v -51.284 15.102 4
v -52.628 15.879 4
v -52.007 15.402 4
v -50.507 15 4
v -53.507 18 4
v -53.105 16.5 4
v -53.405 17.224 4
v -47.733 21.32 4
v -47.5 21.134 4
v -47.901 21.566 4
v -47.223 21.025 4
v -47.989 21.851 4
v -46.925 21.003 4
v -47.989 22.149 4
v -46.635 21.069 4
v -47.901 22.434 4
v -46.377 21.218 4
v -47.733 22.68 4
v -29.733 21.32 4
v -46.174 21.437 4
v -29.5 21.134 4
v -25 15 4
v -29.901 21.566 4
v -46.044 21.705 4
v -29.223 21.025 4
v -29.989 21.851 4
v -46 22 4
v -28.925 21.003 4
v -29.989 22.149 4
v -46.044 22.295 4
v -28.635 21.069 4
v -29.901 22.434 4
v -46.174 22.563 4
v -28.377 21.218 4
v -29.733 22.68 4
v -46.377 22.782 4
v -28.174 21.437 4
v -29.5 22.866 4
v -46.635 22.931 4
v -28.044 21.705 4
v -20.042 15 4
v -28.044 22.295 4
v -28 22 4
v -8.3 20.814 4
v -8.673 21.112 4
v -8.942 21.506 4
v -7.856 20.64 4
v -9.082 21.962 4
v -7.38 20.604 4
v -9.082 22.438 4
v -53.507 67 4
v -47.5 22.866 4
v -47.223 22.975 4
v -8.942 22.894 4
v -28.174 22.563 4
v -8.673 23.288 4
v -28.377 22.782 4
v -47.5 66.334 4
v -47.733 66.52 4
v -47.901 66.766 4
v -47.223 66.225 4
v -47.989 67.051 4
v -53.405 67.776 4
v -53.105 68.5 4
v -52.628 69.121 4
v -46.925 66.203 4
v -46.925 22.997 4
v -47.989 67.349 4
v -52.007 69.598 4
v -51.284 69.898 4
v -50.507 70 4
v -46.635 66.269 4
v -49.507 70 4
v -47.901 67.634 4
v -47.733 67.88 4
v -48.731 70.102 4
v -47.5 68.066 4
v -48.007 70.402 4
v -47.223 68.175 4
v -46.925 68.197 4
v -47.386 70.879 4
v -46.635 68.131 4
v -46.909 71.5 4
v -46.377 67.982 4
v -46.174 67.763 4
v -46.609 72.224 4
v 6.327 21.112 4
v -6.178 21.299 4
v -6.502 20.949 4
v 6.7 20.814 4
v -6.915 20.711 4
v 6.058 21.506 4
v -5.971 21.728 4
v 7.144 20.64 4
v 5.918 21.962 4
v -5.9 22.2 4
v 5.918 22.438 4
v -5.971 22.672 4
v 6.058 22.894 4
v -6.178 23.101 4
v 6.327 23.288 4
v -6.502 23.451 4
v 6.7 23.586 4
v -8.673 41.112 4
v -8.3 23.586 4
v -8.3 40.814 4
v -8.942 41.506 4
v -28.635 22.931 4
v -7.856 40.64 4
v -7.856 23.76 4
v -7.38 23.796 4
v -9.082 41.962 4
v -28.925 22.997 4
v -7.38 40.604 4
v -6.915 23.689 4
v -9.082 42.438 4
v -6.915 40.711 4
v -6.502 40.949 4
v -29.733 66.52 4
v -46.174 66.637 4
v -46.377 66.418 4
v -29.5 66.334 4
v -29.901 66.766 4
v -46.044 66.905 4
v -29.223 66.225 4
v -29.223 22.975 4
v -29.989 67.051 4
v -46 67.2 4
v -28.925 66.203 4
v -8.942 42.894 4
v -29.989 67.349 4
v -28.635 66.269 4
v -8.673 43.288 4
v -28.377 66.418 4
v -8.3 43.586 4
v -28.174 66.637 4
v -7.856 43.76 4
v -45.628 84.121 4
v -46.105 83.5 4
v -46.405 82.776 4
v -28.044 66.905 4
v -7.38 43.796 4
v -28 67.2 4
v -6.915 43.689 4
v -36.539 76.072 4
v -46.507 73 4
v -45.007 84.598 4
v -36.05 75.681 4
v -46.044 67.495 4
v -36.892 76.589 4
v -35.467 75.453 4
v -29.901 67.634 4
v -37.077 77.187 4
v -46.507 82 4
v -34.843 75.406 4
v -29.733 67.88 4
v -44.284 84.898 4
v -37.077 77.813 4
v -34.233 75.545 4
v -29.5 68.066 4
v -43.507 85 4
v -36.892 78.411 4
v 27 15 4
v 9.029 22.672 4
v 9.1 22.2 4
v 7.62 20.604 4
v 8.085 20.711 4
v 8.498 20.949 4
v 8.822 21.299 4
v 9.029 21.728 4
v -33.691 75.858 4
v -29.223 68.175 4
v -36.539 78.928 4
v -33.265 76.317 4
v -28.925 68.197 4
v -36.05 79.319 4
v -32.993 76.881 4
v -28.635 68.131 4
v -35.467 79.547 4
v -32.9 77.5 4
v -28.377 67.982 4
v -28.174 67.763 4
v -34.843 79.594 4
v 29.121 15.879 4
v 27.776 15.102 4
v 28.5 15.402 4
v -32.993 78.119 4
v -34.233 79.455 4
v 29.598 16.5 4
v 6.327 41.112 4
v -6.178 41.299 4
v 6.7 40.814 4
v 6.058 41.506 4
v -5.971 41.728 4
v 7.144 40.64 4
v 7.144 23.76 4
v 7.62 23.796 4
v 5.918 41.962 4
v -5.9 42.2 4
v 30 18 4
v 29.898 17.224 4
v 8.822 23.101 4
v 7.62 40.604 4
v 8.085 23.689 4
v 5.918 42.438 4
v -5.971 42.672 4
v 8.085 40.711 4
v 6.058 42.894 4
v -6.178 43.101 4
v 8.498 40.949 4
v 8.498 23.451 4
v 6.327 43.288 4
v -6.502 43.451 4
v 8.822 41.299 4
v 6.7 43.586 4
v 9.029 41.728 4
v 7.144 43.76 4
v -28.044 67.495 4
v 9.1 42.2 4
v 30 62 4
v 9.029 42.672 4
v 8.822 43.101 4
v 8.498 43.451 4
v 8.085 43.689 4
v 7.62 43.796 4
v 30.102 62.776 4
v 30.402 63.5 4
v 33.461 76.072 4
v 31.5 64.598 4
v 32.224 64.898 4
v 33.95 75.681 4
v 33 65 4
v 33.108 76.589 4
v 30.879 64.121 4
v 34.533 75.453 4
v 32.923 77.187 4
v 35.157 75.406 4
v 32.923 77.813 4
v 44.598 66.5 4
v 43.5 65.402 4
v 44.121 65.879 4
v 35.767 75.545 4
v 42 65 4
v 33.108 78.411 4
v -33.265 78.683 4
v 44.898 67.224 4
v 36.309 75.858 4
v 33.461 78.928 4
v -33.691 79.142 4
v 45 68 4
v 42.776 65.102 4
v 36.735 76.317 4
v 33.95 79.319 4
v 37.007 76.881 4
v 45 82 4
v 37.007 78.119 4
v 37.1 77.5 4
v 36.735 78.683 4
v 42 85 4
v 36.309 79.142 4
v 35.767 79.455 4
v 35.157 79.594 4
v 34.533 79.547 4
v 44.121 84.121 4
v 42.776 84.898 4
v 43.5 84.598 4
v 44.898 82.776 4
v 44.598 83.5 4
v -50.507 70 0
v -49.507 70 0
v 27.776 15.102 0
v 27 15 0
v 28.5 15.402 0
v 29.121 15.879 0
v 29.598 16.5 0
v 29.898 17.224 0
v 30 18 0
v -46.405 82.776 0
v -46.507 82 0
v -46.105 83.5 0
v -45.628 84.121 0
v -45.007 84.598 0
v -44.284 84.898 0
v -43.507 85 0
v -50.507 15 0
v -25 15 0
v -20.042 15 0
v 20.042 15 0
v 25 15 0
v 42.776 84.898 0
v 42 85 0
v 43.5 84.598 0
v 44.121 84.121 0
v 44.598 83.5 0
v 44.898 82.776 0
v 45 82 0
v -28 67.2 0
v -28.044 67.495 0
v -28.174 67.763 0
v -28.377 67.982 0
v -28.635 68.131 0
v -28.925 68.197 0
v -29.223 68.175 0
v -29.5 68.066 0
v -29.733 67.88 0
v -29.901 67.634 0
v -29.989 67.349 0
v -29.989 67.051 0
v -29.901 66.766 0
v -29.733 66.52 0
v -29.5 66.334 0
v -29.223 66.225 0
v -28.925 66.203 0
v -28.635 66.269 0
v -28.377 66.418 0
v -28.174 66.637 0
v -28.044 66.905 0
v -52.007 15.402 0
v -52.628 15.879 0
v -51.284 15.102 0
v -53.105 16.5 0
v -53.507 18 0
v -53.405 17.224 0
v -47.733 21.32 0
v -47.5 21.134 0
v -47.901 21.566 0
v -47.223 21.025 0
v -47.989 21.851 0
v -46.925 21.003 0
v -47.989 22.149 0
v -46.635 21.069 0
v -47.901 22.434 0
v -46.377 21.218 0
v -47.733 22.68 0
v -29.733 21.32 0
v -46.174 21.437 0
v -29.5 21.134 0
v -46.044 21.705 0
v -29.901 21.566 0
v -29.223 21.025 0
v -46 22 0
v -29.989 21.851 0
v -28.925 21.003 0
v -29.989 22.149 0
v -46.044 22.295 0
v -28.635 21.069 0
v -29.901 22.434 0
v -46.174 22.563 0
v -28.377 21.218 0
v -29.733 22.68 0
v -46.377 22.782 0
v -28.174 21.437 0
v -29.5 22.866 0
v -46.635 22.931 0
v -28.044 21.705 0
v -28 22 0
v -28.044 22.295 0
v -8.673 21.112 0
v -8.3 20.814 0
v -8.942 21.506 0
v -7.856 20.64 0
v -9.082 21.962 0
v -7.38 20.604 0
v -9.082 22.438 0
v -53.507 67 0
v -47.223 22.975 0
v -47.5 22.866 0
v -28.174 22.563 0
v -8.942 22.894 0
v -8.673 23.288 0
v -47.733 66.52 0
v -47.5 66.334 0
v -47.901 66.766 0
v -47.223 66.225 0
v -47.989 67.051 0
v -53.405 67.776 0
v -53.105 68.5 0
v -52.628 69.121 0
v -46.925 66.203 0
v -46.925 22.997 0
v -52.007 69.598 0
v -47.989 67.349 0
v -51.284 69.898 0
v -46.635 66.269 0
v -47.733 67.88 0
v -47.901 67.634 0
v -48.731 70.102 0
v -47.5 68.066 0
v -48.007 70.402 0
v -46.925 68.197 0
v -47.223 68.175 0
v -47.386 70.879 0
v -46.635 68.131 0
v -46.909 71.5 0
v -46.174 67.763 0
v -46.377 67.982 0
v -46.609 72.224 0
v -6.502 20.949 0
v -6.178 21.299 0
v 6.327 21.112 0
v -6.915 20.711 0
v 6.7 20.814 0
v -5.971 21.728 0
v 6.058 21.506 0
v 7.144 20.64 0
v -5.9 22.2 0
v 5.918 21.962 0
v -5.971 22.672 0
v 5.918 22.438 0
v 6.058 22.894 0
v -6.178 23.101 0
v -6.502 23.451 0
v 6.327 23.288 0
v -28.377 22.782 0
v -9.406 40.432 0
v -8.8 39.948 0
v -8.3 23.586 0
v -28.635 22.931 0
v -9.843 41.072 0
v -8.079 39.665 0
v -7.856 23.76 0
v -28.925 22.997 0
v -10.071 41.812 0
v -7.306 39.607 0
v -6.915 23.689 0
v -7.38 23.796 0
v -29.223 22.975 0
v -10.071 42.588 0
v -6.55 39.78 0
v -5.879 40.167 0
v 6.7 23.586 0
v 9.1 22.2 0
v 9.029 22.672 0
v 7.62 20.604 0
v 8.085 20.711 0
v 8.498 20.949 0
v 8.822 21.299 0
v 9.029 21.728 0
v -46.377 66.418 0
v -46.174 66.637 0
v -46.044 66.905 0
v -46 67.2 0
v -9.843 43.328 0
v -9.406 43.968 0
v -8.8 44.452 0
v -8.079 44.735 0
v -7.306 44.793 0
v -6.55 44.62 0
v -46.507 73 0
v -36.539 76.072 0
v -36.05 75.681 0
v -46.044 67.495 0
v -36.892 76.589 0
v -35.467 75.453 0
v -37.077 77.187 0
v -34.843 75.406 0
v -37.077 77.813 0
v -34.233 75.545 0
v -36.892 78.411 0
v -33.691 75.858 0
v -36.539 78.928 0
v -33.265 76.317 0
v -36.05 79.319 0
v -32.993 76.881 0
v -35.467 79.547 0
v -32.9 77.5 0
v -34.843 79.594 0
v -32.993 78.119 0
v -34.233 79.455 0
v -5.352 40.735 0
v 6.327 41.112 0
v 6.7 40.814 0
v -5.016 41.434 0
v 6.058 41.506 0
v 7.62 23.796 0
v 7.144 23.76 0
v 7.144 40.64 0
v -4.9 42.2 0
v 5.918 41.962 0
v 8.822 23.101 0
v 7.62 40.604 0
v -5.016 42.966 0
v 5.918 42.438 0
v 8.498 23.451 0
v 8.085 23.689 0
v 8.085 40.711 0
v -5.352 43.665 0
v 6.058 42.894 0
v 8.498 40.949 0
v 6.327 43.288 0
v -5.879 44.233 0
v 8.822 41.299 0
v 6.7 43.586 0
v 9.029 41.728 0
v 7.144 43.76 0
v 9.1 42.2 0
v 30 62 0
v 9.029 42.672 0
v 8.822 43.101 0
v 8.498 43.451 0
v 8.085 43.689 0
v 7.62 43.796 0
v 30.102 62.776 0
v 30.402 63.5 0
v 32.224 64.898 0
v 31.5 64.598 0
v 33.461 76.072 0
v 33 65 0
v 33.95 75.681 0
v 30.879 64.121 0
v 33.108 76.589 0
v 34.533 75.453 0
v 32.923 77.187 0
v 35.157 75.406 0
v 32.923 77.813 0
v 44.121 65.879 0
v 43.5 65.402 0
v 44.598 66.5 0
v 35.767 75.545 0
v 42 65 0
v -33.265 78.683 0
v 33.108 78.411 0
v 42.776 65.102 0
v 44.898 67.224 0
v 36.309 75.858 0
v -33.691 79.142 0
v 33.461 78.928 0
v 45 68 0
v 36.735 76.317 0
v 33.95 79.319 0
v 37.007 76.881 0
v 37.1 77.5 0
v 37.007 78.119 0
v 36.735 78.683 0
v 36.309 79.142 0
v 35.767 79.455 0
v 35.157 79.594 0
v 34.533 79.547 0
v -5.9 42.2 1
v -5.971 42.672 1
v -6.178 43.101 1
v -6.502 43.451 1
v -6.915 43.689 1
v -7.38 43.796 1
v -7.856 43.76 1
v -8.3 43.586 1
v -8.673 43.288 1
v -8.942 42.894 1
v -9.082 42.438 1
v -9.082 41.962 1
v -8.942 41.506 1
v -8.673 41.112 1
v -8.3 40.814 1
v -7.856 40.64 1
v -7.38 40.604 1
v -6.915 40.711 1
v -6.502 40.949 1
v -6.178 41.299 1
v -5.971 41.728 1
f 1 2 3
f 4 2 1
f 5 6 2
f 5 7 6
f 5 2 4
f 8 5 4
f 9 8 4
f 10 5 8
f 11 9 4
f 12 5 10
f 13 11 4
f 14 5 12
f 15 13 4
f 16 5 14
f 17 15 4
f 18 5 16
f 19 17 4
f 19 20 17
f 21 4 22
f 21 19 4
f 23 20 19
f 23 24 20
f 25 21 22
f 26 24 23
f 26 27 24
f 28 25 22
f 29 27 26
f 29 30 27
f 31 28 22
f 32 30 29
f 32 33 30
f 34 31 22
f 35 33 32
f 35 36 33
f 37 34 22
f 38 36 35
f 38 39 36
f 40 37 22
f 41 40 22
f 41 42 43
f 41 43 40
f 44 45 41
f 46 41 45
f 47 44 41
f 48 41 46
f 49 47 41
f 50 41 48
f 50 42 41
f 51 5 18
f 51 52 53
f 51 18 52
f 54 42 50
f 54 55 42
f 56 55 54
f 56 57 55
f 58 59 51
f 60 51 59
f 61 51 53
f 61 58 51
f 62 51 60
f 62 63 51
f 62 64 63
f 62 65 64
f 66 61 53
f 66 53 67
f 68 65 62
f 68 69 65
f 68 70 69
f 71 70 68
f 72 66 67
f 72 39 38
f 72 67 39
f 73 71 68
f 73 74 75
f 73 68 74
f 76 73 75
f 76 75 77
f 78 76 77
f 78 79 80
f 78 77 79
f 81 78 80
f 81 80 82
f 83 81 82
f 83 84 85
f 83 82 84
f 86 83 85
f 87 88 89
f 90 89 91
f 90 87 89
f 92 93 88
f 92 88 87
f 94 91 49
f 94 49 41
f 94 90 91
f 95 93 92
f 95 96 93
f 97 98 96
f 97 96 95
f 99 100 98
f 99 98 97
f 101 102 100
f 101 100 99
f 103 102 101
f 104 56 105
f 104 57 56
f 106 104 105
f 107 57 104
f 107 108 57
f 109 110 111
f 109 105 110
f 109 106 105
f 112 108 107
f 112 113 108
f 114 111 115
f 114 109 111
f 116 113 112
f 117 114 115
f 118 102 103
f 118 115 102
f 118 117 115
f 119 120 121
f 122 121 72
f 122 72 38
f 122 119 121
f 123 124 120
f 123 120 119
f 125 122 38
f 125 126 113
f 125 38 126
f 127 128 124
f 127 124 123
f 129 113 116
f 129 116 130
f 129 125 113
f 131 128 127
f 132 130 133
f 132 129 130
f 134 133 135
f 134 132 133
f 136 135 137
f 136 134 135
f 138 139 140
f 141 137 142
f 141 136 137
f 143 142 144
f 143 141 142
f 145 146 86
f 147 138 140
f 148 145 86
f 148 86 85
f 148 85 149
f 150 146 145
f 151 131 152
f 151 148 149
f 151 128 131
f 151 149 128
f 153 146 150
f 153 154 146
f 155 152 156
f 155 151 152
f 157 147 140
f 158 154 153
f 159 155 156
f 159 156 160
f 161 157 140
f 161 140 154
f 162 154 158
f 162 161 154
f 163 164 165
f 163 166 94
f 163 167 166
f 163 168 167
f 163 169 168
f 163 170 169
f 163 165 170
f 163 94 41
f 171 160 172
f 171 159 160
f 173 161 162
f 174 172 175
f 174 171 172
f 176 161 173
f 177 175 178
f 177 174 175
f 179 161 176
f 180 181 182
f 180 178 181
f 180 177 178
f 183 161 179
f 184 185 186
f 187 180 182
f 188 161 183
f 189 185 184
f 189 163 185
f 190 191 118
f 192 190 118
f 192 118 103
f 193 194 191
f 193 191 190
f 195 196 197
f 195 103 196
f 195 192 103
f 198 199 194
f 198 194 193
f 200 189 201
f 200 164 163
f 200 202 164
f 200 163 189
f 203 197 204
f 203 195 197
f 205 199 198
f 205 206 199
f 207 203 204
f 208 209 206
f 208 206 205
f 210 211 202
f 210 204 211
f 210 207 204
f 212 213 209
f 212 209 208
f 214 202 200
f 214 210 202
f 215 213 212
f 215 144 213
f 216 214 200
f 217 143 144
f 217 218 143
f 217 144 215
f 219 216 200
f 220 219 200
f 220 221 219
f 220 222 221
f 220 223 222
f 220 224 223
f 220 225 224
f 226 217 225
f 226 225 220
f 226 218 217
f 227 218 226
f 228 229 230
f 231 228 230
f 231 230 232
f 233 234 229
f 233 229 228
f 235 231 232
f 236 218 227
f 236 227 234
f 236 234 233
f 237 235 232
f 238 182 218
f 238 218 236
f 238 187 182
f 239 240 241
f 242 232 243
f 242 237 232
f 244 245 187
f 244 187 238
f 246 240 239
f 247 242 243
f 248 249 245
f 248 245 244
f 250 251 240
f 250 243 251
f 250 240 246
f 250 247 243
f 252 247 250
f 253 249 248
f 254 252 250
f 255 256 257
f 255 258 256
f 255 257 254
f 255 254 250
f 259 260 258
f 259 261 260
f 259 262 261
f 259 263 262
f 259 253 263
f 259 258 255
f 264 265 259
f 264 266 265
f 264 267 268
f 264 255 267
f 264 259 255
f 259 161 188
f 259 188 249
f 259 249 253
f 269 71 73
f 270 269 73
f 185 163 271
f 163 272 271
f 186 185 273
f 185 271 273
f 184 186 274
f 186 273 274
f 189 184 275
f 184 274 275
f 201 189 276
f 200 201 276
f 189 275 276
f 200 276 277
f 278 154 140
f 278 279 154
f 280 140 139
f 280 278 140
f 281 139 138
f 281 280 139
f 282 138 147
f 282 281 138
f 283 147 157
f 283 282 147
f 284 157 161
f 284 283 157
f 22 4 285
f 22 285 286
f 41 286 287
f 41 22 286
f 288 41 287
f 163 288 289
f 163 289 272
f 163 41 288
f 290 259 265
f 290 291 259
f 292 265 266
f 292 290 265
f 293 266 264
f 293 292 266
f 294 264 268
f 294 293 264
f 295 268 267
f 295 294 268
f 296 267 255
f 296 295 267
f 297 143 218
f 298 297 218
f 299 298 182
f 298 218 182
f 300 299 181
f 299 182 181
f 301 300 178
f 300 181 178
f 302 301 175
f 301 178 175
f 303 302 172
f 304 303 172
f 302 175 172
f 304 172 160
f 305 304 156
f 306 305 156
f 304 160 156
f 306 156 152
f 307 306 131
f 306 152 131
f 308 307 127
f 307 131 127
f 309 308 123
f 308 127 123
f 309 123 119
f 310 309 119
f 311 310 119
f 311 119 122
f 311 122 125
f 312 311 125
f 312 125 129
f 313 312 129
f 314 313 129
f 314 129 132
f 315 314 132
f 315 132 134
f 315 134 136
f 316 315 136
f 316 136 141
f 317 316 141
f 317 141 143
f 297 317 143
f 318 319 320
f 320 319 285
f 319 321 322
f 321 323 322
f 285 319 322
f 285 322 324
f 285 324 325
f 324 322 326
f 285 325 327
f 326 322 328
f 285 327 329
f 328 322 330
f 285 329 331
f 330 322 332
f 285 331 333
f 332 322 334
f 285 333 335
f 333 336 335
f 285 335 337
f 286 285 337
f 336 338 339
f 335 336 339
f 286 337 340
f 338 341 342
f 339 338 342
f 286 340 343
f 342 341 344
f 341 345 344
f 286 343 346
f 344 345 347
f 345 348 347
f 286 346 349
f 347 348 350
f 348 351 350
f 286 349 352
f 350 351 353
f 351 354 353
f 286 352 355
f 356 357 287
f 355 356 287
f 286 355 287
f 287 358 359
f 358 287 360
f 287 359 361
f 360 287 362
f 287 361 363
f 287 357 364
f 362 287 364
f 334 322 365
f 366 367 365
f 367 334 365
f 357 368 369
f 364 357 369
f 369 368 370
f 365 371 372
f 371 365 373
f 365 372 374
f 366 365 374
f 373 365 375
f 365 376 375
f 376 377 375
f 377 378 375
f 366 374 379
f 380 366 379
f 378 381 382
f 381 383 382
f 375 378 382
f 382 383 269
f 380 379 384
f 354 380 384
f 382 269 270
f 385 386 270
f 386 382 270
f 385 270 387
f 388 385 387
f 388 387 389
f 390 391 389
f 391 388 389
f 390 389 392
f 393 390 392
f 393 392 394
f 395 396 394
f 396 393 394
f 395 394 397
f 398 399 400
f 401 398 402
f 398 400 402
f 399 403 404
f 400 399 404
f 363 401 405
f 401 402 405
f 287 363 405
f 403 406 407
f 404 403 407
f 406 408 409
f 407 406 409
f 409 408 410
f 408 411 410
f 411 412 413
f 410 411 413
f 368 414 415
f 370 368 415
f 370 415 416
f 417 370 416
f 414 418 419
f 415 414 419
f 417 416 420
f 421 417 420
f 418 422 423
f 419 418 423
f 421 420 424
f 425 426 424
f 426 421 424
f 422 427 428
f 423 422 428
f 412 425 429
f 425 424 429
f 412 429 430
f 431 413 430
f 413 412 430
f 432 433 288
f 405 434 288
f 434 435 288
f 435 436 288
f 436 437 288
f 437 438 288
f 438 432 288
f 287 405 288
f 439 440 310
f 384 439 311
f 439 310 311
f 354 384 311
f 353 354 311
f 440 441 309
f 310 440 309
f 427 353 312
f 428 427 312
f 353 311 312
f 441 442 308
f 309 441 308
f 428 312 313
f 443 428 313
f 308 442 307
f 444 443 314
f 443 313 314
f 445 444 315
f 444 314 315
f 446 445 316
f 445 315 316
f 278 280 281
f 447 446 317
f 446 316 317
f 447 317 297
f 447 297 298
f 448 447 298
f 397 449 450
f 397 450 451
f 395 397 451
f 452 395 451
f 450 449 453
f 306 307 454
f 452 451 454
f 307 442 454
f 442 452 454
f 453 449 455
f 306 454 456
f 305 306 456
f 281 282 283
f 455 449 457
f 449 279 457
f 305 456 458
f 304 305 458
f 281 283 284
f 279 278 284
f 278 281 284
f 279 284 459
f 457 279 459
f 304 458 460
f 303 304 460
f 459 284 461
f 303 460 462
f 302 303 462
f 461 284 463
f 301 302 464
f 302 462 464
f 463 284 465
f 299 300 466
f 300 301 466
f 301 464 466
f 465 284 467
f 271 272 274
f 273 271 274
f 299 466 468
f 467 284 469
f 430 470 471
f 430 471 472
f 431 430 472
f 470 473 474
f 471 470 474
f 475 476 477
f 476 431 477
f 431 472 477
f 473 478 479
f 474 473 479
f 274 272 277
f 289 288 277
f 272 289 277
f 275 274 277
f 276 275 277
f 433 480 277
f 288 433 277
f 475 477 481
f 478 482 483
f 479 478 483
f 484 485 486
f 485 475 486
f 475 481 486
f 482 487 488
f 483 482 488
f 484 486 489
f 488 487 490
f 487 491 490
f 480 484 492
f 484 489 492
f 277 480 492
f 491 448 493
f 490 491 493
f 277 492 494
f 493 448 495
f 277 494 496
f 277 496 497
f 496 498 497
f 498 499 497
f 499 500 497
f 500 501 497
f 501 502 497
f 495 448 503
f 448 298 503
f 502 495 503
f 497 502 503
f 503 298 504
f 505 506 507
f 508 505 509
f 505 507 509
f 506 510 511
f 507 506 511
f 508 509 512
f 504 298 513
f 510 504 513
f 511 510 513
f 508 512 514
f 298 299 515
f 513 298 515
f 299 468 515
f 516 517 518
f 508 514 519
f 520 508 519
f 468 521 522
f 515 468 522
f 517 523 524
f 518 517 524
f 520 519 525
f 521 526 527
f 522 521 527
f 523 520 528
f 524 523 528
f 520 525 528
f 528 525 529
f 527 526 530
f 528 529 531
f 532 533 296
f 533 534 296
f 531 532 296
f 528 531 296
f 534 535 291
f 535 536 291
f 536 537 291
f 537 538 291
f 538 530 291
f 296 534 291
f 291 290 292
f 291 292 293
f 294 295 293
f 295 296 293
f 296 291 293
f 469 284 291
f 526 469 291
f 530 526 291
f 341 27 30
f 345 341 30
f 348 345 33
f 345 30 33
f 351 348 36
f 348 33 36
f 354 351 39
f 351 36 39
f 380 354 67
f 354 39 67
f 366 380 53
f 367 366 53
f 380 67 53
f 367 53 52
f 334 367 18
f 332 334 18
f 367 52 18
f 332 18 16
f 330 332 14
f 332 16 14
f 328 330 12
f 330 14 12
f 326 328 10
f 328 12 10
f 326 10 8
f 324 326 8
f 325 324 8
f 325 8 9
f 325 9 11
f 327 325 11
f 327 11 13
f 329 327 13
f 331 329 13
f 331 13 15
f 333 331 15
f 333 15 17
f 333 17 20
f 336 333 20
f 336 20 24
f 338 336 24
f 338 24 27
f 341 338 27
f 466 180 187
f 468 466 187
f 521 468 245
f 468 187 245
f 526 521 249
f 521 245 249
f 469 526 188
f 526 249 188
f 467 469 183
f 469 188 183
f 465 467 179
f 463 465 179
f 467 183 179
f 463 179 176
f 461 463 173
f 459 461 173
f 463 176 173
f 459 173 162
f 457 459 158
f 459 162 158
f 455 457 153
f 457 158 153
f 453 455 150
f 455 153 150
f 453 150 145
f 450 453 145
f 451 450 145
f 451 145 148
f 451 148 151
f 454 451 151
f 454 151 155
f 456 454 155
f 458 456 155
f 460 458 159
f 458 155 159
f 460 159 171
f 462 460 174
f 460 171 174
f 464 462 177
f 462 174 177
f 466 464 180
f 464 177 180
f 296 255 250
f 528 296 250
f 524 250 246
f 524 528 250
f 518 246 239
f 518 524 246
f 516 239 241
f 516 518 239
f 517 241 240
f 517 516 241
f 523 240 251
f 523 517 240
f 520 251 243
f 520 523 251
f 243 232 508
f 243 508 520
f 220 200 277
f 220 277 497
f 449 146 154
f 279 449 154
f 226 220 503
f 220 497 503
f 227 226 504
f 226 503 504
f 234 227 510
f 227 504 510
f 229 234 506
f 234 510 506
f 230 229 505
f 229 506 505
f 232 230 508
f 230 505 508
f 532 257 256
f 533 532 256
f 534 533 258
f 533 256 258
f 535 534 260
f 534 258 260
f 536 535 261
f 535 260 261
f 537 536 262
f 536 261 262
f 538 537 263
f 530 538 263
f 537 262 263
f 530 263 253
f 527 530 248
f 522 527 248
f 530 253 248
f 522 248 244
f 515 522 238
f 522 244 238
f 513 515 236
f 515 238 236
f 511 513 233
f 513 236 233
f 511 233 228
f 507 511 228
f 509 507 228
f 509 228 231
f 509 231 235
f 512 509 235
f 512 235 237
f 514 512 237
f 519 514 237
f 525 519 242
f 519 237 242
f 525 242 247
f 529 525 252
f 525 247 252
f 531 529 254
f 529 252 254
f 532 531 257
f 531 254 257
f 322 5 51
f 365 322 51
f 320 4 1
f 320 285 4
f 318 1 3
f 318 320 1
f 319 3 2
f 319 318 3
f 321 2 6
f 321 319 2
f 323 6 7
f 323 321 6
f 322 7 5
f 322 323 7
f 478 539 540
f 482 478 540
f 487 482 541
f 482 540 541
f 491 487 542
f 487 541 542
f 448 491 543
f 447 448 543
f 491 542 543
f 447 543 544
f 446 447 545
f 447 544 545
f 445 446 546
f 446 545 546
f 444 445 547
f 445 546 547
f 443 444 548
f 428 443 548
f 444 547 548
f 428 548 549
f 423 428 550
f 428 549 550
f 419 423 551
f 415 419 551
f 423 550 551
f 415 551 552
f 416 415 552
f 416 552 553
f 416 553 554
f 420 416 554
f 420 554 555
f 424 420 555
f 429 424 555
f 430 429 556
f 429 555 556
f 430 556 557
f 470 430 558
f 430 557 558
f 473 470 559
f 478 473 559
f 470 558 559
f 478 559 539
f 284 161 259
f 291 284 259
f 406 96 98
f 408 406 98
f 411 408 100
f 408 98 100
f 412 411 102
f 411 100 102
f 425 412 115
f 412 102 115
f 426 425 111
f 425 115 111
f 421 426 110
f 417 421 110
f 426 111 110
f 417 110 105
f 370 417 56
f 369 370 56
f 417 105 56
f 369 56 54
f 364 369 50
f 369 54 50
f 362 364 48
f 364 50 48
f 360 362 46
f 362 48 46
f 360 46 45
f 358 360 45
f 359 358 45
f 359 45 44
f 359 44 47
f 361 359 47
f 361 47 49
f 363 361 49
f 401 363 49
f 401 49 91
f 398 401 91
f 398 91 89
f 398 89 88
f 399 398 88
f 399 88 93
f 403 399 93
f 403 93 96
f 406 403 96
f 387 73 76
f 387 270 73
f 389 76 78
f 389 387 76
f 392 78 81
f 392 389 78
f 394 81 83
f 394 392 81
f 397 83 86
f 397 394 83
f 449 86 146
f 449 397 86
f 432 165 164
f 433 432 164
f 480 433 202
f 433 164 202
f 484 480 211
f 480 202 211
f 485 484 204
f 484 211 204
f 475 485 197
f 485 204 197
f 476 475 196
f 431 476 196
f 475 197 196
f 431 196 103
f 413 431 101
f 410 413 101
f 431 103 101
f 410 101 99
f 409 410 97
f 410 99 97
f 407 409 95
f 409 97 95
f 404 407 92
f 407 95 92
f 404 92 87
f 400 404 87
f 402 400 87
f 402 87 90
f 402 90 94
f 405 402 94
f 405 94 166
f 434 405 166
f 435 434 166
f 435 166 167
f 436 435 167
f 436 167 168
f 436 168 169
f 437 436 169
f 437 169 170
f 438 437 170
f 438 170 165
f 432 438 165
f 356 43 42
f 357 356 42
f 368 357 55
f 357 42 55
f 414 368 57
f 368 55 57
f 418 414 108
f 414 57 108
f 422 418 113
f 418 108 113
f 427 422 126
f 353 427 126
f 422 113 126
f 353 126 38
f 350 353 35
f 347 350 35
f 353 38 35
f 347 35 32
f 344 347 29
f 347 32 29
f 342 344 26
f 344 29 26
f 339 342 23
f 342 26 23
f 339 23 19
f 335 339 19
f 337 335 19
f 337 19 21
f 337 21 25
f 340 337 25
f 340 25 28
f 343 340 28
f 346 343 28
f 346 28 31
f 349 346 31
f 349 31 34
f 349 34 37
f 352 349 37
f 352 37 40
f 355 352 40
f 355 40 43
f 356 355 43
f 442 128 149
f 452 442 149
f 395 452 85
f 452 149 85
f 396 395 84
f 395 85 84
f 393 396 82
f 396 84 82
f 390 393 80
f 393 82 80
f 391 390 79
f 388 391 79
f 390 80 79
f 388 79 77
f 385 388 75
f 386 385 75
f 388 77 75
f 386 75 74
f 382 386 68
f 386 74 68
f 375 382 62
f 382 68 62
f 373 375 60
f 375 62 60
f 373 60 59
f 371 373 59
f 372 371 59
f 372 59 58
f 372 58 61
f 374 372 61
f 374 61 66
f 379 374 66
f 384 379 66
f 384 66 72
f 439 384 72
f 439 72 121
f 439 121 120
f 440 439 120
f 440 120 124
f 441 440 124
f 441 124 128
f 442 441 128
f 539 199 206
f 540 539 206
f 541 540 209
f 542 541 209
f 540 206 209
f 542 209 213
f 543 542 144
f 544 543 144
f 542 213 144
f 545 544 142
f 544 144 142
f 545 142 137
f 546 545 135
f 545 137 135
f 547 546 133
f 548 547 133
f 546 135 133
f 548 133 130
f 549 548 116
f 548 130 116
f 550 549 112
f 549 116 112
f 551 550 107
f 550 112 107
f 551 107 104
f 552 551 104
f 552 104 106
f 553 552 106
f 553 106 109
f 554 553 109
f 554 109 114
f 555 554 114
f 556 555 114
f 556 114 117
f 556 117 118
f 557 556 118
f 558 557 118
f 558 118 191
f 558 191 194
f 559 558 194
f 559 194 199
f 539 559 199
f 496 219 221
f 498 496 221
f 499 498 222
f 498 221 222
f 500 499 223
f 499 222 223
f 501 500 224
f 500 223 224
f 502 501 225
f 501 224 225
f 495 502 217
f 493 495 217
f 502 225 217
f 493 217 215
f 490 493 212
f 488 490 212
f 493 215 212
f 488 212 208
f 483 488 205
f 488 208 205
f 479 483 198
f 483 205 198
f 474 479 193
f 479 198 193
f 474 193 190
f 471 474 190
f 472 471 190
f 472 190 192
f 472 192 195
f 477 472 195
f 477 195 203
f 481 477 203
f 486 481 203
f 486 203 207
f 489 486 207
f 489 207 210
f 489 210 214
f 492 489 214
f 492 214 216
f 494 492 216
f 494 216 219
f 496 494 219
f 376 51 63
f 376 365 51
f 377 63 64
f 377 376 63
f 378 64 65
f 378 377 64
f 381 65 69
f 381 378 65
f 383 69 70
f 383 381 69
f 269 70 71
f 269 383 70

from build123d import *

# Parameters (mm, degrees)
SKETCH_1_W          = 250
SKETCH_1_H          = 30
SKETCH_1_R          = 1.5
EXTRUDE_1_DEPTH     = 4
SKETCH_2_R          = 3
CUT_EXTRUDE_1_DEPTH = 126.96031121
SKETCH_3_W          = 250
SKETCH_3_H          = 70
SKETCH_3_R          = 1.5
SKETCH_3_R_2        = 2.1
EXTRUDE_2_DEPTH     = 4
CUT_EXTRUDE_2_DEPTH = 152.215078613
FILLET_1_R          = 5
SKETCH_5_R          = 3
CUT_EXTRUDE_3_DEPTH = 152.215078613
SKETCH_8_W          = 20
SKETCH_8_H          = 50
EXTRUDE_4_DEPTH     = 4
SKETCH_9_R          = 1
CUT_EXTRUDE_4_DEPTH = 10
SKETCH_10_W         = 35
SKETCH_10_H         = 30
CUT_EXTRUDE_5_DEPTH = 10
SKETCH_11_W         = 70
SKETCH_11_H         = 4.604086331
EXTRUDE_5_DEPTH     = 4
FILLET_4_R          = 10
CUT_EXTRUDE_6_DEPTH = 10
SKETCH_14_W         = 11.507162467
SKETCH_14_H         = 5
EXTRUDE_6_DEPTH     = 4
SKETCH_15_W         = 3
SKETCH_15_H         = 55
SKETCH_15_W_2       = 15
SKETCH_15_H_2       = 50
CUT_EXTRUDE_7_DEPTH = 10
FILLET_6_R          = 3
SKETCH_16_R         = 1.6
CUT_EXTRUDE_8_DEPTH = 10
CHAMFER_2_SIZE      = 1


with BuildPart() as part:
    # 草图1 → 凸台-拉伸1 (new body)
    with BuildSketch(Plane.XY):
        Rectangle(SKETCH_1_W, SKETCH_1_H)
        with Locations((-115, -10)):
            Circle(SKETCH_1_R, mode=Mode.SUBTRACT)
        with Locations((-115, 10)):
            Circle(SKETCH_1_R, mode=Mode.SUBTRACT)
        with Locations(Location((115, 10, 0), (0, 0, 180))):
            Circle(SKETCH_1_R, mode=Mode.SUBTRACT)
        with Locations(Location((115, -10, 0), (0, 0, 180))):
            Circle(SKETCH_1_R, mode=Mode.SUBTRACT)
    extrude(amount=EXTRUDE_1_DEPTH)

    # 草图2 → 切除-拉伸1 (cut, through all)
    with BuildSketch(Plane.XY.offset(4)):
        with Locations((-23, 2.5)):
            Circle(SKETCH_2_R)
        with Locations((23, 2.5)):
            Circle(SKETCH_2_R)
        with Locations((23, 15.5)):
            Circle(SKETCH_2_R)
        with Locations((-23, 15.5)):
            Circle(SKETCH_2_R)
    extrude(amount=-CUT_EXTRUDE_1_DEPTH, mode=Mode.SUBTRACT)

    # 草图3 → 凸台-拉伸2 (add)
    with BuildSketch(Plane.XY.offset(4)):
        with Locations((0, 50)):
            Rectangle(SKETCH_3_W, SKETCH_3_H)
        with Locations((-115, 30)):
            Circle(SKETCH_3_R, mode=Mode.SUBTRACT)
        with Locations((-115, 50)):
            Circle(SKETCH_3_R, mode=Mode.SUBTRACT)
        with Locations((-115, 70)):
            Circle(SKETCH_3_R, mode=Mode.SUBTRACT)
        with Locations((115, 30)):
            Circle(SKETCH_3_R, mode=Mode.SUBTRACT)
        with Locations((115, 50)):
            Circle(SKETCH_3_R, mode=Mode.SUBTRACT)
        with Locations((115, 70)):
            Circle(SKETCH_3_R, mode=Mode.SUBTRACT)
        with Locations((-35, 77.5)):
            Circle(SKETCH_3_R_2, mode=Mode.SUBTRACT)
        with Locations((35, 77.5)):
            Circle(SKETCH_3_R_2, mode=Mode.SUBTRACT)
    extrude(amount=-EXTRUDE_2_DEPTH)

    # 草图4 → 切除-拉伸2 (cut, through all)
    with BuildSketch(Plane.XY.offset(4)):
        with BuildLine():
            Line((-97, 70), (-48, 70))
            ThreePointArc((-48, 70), (-45.878679656, 69.121320344), (-45, 67))
            Line((-45, 67), (-45, 3))
            ThreePointArc((-45, 3), (-45.878679656, 0.878679656), (-48, 0))
            Line((-48, 0), (-97, 0))
            ThreePointArc((-97, 0), (-99.121320344, 0.878679656), (-100, 3))
            Line((-100, 3), (-100, 67))
            ThreePointArc((-100, 67), (-99.121320344, 69.121320344), (-97, 70))
        make_face()
        with BuildLine():
            Line((97, 0), (48, 0))
            ThreePointArc((48, 0), (45.878679656, 0.878679656), (45, 3))
            Line((45, 3), (45, 67))
            ThreePointArc((45, 67), (45.878679656, 69.121320344), (48, 70))
            Line((48, 70), (97, 70))
            ThreePointArc((97, 70), (99.121320344, 69.121320344), (100, 67))
            Line((100, 67), (100, 3))
            ThreePointArc((100, 3), (99.121320344, 0.878679656), (97, 0))
        make_face()
    extrude(amount=-CUT_EXTRUDE_2_DEPTH, mode=Mode.SUBTRACT)

    # 圆角1
    fillet_1_edges = [part.edges().sort_by_distance(p)[0] for p in [
        (125, 85, 2),
        (-125, 85, 2),
        (125, -15, 2),
        (-125, -15, 2),
    ]]
    fillet(fillet_1_edges, radius=FILLET_1_R)

    # 草图5 → 切除-拉伸3 (cut, through all)
    with BuildSketch(Plane.XY.offset(4)):
        with Locations((-23, 15.5)):
            Circle(SKETCH_5_R)
        with Locations((23, 15.5)):
            Circle(SKETCH_5_R)
    extrude(amount=-CUT_EXTRUDE_3_DEPTH, mode=Mode.SUBTRACT)

    # 草图8 → 凸台-拉伸4 (add)
    with BuildSketch(Plane.XY.offset(4)):
        with Locations((-55, 45)):
            Rectangle(SKETCH_8_W, SKETCH_8_H)
    extrude(amount=-EXTRUDE_4_DEPTH)

    # 草图9 → 切除-拉伸4 (cut)
    with BuildSketch(Plane.XY.offset(4)):
        with Locations((-47, 22)):
            Circle(SKETCH_9_R)
        with Locations((-29, 22)):
            Circle(SKETCH_9_R)
        with Locations((-47, 67.2)):
            Circle(SKETCH_9_R)
        with Locations((-29, 67.2)):
            Circle(SKETCH_9_R)
    extrude(amount=-CUT_EXTRUDE_4_DEPTH, mode=Mode.SUBTRACT)

    # 草图10 → 切除-拉伸5 (cut)
    with BuildSketch(Plane.XY.offset(4)):
        with Locations((-17.5, 0)):
            Rectangle(SKETCH_10_W, SKETCH_10_H)
        with Locations((17.5, 0)):
            Rectangle(SKETCH_10_W, SKETCH_10_H)
    extrude(amount=-CUT_EXTRUDE_5_DEPTH, mode=Mode.SUBTRACT)

    # 草图11 → 凸台-拉伸5 (add)
    with BuildSketch(Plane.XY.offset(4)):
        with Locations((0, 17.302043166)):
            Rectangle(SKETCH_11_W, SKETCH_11_H)
    extrude(amount=-EXTRUDE_5_DEPTH)

    # 圆角4
    fillet_4_edges = [part.edges().sort_by_distance(p)[0] for p in [
        (-35, -15, 2),
        (35, -15, 2),
        (35, 15, 2),
        (-35, 15, 2),
    ]]
    fillet(fillet_4_edges, radius=FILLET_4_R)

    # 草图12 → 切除-拉伸6 (cut)
    with BuildSketch(Plane.XY.offset(4)):
        Polygon((-159.482057717, 67), (-159.482057717, -21.443198138), (-25, -21.443198138), (-25, 15), (-56.507162467, 15), (-56.507162467, 102.331531395), (-144.590660761, 102.331531395), (-144.590660761, 67), align=None)
        Polygon((45, 102.331531395), (45, 15), (25, 15), (25, -21.443198138), (159.482057717, -21.443198138), (159.482057717, 67), (144.590660761, 67), (144.590660761, 102.331531395), align=None)
    extrude(amount=-CUT_EXTRUDE_6_DEPTH, mode=Mode.SUBTRACT)

    # 草图14 → 凸台-拉伸6 (add)
    with BuildSketch(Plane.XY.offset(4)):
        with Locations((-50.753581234, 17.5)):
            Rectangle(SKETCH_14_W, SKETCH_14_H)
    extrude(amount=-EXTRUDE_6_DEPTH)

    # 草图15 → 切除-拉伸7 (cut)
    with BuildSketch(Plane.XY.offset(4)):
        Polygon((-56.507162467, 70), (-53.507162467, 70), (-46.507162467, 70), (-46.507162467, 85), (-56.507162467, 85), align=None)
        with Locations((-55.007162467, 42.5)):
            Rectangle(SKETCH_15_W, SKETCH_15_H)
        with Locations((37.5, 40)):
            Rectangle(SKETCH_15_W_2, SKETCH_15_H_2)
    extrude(amount=-CUT_EXTRUDE_7_DEPTH, mode=Mode.SUBTRACT)

    # 圆角6
    fillet_6_edges = [part.edges().sort_by_distance(p)[0] for p in [
        (45, 85, 2),
        (30, 15, 2),
        (-46.507162467, 70, 2),
        (-46.507162467, 85, 2),
        (-53.507162467, 70, 2),
        (-53.507162467, 15, 2),
        (30, 65, 2),
        (45, 65, 2),
    ]]
    fillet(fillet_6_edges, radius=FILLET_6_R)

    # 草图16 → 切除-拉伸8 (cut)
    with BuildSketch(Plane.XY.offset(4)):
        with Locations((-7.5, 42.2)):
            Circle(SKETCH_16_R)
        with Locations((7.5, 42.2)):
            Circle(SKETCH_16_R)
        with Locations((-7.5, 22.2)):
            Circle(SKETCH_16_R)
        with Locations((7.5, 22.2)):
            Circle(SKETCH_16_R)
    extrude(amount=-CUT_EXTRUDE_8_DEPTH, mode=Mode.SUBTRACT)

    # 倒角2
    chamfer_2_edges = [part.edges().sort_by_distance(p)[0] for p in [
        (-9.1, 42.2, 0),
    ]]
    chamfer(chamfer_2_edges, length=CHAMFER_2_SIZE)


solid = part.part
